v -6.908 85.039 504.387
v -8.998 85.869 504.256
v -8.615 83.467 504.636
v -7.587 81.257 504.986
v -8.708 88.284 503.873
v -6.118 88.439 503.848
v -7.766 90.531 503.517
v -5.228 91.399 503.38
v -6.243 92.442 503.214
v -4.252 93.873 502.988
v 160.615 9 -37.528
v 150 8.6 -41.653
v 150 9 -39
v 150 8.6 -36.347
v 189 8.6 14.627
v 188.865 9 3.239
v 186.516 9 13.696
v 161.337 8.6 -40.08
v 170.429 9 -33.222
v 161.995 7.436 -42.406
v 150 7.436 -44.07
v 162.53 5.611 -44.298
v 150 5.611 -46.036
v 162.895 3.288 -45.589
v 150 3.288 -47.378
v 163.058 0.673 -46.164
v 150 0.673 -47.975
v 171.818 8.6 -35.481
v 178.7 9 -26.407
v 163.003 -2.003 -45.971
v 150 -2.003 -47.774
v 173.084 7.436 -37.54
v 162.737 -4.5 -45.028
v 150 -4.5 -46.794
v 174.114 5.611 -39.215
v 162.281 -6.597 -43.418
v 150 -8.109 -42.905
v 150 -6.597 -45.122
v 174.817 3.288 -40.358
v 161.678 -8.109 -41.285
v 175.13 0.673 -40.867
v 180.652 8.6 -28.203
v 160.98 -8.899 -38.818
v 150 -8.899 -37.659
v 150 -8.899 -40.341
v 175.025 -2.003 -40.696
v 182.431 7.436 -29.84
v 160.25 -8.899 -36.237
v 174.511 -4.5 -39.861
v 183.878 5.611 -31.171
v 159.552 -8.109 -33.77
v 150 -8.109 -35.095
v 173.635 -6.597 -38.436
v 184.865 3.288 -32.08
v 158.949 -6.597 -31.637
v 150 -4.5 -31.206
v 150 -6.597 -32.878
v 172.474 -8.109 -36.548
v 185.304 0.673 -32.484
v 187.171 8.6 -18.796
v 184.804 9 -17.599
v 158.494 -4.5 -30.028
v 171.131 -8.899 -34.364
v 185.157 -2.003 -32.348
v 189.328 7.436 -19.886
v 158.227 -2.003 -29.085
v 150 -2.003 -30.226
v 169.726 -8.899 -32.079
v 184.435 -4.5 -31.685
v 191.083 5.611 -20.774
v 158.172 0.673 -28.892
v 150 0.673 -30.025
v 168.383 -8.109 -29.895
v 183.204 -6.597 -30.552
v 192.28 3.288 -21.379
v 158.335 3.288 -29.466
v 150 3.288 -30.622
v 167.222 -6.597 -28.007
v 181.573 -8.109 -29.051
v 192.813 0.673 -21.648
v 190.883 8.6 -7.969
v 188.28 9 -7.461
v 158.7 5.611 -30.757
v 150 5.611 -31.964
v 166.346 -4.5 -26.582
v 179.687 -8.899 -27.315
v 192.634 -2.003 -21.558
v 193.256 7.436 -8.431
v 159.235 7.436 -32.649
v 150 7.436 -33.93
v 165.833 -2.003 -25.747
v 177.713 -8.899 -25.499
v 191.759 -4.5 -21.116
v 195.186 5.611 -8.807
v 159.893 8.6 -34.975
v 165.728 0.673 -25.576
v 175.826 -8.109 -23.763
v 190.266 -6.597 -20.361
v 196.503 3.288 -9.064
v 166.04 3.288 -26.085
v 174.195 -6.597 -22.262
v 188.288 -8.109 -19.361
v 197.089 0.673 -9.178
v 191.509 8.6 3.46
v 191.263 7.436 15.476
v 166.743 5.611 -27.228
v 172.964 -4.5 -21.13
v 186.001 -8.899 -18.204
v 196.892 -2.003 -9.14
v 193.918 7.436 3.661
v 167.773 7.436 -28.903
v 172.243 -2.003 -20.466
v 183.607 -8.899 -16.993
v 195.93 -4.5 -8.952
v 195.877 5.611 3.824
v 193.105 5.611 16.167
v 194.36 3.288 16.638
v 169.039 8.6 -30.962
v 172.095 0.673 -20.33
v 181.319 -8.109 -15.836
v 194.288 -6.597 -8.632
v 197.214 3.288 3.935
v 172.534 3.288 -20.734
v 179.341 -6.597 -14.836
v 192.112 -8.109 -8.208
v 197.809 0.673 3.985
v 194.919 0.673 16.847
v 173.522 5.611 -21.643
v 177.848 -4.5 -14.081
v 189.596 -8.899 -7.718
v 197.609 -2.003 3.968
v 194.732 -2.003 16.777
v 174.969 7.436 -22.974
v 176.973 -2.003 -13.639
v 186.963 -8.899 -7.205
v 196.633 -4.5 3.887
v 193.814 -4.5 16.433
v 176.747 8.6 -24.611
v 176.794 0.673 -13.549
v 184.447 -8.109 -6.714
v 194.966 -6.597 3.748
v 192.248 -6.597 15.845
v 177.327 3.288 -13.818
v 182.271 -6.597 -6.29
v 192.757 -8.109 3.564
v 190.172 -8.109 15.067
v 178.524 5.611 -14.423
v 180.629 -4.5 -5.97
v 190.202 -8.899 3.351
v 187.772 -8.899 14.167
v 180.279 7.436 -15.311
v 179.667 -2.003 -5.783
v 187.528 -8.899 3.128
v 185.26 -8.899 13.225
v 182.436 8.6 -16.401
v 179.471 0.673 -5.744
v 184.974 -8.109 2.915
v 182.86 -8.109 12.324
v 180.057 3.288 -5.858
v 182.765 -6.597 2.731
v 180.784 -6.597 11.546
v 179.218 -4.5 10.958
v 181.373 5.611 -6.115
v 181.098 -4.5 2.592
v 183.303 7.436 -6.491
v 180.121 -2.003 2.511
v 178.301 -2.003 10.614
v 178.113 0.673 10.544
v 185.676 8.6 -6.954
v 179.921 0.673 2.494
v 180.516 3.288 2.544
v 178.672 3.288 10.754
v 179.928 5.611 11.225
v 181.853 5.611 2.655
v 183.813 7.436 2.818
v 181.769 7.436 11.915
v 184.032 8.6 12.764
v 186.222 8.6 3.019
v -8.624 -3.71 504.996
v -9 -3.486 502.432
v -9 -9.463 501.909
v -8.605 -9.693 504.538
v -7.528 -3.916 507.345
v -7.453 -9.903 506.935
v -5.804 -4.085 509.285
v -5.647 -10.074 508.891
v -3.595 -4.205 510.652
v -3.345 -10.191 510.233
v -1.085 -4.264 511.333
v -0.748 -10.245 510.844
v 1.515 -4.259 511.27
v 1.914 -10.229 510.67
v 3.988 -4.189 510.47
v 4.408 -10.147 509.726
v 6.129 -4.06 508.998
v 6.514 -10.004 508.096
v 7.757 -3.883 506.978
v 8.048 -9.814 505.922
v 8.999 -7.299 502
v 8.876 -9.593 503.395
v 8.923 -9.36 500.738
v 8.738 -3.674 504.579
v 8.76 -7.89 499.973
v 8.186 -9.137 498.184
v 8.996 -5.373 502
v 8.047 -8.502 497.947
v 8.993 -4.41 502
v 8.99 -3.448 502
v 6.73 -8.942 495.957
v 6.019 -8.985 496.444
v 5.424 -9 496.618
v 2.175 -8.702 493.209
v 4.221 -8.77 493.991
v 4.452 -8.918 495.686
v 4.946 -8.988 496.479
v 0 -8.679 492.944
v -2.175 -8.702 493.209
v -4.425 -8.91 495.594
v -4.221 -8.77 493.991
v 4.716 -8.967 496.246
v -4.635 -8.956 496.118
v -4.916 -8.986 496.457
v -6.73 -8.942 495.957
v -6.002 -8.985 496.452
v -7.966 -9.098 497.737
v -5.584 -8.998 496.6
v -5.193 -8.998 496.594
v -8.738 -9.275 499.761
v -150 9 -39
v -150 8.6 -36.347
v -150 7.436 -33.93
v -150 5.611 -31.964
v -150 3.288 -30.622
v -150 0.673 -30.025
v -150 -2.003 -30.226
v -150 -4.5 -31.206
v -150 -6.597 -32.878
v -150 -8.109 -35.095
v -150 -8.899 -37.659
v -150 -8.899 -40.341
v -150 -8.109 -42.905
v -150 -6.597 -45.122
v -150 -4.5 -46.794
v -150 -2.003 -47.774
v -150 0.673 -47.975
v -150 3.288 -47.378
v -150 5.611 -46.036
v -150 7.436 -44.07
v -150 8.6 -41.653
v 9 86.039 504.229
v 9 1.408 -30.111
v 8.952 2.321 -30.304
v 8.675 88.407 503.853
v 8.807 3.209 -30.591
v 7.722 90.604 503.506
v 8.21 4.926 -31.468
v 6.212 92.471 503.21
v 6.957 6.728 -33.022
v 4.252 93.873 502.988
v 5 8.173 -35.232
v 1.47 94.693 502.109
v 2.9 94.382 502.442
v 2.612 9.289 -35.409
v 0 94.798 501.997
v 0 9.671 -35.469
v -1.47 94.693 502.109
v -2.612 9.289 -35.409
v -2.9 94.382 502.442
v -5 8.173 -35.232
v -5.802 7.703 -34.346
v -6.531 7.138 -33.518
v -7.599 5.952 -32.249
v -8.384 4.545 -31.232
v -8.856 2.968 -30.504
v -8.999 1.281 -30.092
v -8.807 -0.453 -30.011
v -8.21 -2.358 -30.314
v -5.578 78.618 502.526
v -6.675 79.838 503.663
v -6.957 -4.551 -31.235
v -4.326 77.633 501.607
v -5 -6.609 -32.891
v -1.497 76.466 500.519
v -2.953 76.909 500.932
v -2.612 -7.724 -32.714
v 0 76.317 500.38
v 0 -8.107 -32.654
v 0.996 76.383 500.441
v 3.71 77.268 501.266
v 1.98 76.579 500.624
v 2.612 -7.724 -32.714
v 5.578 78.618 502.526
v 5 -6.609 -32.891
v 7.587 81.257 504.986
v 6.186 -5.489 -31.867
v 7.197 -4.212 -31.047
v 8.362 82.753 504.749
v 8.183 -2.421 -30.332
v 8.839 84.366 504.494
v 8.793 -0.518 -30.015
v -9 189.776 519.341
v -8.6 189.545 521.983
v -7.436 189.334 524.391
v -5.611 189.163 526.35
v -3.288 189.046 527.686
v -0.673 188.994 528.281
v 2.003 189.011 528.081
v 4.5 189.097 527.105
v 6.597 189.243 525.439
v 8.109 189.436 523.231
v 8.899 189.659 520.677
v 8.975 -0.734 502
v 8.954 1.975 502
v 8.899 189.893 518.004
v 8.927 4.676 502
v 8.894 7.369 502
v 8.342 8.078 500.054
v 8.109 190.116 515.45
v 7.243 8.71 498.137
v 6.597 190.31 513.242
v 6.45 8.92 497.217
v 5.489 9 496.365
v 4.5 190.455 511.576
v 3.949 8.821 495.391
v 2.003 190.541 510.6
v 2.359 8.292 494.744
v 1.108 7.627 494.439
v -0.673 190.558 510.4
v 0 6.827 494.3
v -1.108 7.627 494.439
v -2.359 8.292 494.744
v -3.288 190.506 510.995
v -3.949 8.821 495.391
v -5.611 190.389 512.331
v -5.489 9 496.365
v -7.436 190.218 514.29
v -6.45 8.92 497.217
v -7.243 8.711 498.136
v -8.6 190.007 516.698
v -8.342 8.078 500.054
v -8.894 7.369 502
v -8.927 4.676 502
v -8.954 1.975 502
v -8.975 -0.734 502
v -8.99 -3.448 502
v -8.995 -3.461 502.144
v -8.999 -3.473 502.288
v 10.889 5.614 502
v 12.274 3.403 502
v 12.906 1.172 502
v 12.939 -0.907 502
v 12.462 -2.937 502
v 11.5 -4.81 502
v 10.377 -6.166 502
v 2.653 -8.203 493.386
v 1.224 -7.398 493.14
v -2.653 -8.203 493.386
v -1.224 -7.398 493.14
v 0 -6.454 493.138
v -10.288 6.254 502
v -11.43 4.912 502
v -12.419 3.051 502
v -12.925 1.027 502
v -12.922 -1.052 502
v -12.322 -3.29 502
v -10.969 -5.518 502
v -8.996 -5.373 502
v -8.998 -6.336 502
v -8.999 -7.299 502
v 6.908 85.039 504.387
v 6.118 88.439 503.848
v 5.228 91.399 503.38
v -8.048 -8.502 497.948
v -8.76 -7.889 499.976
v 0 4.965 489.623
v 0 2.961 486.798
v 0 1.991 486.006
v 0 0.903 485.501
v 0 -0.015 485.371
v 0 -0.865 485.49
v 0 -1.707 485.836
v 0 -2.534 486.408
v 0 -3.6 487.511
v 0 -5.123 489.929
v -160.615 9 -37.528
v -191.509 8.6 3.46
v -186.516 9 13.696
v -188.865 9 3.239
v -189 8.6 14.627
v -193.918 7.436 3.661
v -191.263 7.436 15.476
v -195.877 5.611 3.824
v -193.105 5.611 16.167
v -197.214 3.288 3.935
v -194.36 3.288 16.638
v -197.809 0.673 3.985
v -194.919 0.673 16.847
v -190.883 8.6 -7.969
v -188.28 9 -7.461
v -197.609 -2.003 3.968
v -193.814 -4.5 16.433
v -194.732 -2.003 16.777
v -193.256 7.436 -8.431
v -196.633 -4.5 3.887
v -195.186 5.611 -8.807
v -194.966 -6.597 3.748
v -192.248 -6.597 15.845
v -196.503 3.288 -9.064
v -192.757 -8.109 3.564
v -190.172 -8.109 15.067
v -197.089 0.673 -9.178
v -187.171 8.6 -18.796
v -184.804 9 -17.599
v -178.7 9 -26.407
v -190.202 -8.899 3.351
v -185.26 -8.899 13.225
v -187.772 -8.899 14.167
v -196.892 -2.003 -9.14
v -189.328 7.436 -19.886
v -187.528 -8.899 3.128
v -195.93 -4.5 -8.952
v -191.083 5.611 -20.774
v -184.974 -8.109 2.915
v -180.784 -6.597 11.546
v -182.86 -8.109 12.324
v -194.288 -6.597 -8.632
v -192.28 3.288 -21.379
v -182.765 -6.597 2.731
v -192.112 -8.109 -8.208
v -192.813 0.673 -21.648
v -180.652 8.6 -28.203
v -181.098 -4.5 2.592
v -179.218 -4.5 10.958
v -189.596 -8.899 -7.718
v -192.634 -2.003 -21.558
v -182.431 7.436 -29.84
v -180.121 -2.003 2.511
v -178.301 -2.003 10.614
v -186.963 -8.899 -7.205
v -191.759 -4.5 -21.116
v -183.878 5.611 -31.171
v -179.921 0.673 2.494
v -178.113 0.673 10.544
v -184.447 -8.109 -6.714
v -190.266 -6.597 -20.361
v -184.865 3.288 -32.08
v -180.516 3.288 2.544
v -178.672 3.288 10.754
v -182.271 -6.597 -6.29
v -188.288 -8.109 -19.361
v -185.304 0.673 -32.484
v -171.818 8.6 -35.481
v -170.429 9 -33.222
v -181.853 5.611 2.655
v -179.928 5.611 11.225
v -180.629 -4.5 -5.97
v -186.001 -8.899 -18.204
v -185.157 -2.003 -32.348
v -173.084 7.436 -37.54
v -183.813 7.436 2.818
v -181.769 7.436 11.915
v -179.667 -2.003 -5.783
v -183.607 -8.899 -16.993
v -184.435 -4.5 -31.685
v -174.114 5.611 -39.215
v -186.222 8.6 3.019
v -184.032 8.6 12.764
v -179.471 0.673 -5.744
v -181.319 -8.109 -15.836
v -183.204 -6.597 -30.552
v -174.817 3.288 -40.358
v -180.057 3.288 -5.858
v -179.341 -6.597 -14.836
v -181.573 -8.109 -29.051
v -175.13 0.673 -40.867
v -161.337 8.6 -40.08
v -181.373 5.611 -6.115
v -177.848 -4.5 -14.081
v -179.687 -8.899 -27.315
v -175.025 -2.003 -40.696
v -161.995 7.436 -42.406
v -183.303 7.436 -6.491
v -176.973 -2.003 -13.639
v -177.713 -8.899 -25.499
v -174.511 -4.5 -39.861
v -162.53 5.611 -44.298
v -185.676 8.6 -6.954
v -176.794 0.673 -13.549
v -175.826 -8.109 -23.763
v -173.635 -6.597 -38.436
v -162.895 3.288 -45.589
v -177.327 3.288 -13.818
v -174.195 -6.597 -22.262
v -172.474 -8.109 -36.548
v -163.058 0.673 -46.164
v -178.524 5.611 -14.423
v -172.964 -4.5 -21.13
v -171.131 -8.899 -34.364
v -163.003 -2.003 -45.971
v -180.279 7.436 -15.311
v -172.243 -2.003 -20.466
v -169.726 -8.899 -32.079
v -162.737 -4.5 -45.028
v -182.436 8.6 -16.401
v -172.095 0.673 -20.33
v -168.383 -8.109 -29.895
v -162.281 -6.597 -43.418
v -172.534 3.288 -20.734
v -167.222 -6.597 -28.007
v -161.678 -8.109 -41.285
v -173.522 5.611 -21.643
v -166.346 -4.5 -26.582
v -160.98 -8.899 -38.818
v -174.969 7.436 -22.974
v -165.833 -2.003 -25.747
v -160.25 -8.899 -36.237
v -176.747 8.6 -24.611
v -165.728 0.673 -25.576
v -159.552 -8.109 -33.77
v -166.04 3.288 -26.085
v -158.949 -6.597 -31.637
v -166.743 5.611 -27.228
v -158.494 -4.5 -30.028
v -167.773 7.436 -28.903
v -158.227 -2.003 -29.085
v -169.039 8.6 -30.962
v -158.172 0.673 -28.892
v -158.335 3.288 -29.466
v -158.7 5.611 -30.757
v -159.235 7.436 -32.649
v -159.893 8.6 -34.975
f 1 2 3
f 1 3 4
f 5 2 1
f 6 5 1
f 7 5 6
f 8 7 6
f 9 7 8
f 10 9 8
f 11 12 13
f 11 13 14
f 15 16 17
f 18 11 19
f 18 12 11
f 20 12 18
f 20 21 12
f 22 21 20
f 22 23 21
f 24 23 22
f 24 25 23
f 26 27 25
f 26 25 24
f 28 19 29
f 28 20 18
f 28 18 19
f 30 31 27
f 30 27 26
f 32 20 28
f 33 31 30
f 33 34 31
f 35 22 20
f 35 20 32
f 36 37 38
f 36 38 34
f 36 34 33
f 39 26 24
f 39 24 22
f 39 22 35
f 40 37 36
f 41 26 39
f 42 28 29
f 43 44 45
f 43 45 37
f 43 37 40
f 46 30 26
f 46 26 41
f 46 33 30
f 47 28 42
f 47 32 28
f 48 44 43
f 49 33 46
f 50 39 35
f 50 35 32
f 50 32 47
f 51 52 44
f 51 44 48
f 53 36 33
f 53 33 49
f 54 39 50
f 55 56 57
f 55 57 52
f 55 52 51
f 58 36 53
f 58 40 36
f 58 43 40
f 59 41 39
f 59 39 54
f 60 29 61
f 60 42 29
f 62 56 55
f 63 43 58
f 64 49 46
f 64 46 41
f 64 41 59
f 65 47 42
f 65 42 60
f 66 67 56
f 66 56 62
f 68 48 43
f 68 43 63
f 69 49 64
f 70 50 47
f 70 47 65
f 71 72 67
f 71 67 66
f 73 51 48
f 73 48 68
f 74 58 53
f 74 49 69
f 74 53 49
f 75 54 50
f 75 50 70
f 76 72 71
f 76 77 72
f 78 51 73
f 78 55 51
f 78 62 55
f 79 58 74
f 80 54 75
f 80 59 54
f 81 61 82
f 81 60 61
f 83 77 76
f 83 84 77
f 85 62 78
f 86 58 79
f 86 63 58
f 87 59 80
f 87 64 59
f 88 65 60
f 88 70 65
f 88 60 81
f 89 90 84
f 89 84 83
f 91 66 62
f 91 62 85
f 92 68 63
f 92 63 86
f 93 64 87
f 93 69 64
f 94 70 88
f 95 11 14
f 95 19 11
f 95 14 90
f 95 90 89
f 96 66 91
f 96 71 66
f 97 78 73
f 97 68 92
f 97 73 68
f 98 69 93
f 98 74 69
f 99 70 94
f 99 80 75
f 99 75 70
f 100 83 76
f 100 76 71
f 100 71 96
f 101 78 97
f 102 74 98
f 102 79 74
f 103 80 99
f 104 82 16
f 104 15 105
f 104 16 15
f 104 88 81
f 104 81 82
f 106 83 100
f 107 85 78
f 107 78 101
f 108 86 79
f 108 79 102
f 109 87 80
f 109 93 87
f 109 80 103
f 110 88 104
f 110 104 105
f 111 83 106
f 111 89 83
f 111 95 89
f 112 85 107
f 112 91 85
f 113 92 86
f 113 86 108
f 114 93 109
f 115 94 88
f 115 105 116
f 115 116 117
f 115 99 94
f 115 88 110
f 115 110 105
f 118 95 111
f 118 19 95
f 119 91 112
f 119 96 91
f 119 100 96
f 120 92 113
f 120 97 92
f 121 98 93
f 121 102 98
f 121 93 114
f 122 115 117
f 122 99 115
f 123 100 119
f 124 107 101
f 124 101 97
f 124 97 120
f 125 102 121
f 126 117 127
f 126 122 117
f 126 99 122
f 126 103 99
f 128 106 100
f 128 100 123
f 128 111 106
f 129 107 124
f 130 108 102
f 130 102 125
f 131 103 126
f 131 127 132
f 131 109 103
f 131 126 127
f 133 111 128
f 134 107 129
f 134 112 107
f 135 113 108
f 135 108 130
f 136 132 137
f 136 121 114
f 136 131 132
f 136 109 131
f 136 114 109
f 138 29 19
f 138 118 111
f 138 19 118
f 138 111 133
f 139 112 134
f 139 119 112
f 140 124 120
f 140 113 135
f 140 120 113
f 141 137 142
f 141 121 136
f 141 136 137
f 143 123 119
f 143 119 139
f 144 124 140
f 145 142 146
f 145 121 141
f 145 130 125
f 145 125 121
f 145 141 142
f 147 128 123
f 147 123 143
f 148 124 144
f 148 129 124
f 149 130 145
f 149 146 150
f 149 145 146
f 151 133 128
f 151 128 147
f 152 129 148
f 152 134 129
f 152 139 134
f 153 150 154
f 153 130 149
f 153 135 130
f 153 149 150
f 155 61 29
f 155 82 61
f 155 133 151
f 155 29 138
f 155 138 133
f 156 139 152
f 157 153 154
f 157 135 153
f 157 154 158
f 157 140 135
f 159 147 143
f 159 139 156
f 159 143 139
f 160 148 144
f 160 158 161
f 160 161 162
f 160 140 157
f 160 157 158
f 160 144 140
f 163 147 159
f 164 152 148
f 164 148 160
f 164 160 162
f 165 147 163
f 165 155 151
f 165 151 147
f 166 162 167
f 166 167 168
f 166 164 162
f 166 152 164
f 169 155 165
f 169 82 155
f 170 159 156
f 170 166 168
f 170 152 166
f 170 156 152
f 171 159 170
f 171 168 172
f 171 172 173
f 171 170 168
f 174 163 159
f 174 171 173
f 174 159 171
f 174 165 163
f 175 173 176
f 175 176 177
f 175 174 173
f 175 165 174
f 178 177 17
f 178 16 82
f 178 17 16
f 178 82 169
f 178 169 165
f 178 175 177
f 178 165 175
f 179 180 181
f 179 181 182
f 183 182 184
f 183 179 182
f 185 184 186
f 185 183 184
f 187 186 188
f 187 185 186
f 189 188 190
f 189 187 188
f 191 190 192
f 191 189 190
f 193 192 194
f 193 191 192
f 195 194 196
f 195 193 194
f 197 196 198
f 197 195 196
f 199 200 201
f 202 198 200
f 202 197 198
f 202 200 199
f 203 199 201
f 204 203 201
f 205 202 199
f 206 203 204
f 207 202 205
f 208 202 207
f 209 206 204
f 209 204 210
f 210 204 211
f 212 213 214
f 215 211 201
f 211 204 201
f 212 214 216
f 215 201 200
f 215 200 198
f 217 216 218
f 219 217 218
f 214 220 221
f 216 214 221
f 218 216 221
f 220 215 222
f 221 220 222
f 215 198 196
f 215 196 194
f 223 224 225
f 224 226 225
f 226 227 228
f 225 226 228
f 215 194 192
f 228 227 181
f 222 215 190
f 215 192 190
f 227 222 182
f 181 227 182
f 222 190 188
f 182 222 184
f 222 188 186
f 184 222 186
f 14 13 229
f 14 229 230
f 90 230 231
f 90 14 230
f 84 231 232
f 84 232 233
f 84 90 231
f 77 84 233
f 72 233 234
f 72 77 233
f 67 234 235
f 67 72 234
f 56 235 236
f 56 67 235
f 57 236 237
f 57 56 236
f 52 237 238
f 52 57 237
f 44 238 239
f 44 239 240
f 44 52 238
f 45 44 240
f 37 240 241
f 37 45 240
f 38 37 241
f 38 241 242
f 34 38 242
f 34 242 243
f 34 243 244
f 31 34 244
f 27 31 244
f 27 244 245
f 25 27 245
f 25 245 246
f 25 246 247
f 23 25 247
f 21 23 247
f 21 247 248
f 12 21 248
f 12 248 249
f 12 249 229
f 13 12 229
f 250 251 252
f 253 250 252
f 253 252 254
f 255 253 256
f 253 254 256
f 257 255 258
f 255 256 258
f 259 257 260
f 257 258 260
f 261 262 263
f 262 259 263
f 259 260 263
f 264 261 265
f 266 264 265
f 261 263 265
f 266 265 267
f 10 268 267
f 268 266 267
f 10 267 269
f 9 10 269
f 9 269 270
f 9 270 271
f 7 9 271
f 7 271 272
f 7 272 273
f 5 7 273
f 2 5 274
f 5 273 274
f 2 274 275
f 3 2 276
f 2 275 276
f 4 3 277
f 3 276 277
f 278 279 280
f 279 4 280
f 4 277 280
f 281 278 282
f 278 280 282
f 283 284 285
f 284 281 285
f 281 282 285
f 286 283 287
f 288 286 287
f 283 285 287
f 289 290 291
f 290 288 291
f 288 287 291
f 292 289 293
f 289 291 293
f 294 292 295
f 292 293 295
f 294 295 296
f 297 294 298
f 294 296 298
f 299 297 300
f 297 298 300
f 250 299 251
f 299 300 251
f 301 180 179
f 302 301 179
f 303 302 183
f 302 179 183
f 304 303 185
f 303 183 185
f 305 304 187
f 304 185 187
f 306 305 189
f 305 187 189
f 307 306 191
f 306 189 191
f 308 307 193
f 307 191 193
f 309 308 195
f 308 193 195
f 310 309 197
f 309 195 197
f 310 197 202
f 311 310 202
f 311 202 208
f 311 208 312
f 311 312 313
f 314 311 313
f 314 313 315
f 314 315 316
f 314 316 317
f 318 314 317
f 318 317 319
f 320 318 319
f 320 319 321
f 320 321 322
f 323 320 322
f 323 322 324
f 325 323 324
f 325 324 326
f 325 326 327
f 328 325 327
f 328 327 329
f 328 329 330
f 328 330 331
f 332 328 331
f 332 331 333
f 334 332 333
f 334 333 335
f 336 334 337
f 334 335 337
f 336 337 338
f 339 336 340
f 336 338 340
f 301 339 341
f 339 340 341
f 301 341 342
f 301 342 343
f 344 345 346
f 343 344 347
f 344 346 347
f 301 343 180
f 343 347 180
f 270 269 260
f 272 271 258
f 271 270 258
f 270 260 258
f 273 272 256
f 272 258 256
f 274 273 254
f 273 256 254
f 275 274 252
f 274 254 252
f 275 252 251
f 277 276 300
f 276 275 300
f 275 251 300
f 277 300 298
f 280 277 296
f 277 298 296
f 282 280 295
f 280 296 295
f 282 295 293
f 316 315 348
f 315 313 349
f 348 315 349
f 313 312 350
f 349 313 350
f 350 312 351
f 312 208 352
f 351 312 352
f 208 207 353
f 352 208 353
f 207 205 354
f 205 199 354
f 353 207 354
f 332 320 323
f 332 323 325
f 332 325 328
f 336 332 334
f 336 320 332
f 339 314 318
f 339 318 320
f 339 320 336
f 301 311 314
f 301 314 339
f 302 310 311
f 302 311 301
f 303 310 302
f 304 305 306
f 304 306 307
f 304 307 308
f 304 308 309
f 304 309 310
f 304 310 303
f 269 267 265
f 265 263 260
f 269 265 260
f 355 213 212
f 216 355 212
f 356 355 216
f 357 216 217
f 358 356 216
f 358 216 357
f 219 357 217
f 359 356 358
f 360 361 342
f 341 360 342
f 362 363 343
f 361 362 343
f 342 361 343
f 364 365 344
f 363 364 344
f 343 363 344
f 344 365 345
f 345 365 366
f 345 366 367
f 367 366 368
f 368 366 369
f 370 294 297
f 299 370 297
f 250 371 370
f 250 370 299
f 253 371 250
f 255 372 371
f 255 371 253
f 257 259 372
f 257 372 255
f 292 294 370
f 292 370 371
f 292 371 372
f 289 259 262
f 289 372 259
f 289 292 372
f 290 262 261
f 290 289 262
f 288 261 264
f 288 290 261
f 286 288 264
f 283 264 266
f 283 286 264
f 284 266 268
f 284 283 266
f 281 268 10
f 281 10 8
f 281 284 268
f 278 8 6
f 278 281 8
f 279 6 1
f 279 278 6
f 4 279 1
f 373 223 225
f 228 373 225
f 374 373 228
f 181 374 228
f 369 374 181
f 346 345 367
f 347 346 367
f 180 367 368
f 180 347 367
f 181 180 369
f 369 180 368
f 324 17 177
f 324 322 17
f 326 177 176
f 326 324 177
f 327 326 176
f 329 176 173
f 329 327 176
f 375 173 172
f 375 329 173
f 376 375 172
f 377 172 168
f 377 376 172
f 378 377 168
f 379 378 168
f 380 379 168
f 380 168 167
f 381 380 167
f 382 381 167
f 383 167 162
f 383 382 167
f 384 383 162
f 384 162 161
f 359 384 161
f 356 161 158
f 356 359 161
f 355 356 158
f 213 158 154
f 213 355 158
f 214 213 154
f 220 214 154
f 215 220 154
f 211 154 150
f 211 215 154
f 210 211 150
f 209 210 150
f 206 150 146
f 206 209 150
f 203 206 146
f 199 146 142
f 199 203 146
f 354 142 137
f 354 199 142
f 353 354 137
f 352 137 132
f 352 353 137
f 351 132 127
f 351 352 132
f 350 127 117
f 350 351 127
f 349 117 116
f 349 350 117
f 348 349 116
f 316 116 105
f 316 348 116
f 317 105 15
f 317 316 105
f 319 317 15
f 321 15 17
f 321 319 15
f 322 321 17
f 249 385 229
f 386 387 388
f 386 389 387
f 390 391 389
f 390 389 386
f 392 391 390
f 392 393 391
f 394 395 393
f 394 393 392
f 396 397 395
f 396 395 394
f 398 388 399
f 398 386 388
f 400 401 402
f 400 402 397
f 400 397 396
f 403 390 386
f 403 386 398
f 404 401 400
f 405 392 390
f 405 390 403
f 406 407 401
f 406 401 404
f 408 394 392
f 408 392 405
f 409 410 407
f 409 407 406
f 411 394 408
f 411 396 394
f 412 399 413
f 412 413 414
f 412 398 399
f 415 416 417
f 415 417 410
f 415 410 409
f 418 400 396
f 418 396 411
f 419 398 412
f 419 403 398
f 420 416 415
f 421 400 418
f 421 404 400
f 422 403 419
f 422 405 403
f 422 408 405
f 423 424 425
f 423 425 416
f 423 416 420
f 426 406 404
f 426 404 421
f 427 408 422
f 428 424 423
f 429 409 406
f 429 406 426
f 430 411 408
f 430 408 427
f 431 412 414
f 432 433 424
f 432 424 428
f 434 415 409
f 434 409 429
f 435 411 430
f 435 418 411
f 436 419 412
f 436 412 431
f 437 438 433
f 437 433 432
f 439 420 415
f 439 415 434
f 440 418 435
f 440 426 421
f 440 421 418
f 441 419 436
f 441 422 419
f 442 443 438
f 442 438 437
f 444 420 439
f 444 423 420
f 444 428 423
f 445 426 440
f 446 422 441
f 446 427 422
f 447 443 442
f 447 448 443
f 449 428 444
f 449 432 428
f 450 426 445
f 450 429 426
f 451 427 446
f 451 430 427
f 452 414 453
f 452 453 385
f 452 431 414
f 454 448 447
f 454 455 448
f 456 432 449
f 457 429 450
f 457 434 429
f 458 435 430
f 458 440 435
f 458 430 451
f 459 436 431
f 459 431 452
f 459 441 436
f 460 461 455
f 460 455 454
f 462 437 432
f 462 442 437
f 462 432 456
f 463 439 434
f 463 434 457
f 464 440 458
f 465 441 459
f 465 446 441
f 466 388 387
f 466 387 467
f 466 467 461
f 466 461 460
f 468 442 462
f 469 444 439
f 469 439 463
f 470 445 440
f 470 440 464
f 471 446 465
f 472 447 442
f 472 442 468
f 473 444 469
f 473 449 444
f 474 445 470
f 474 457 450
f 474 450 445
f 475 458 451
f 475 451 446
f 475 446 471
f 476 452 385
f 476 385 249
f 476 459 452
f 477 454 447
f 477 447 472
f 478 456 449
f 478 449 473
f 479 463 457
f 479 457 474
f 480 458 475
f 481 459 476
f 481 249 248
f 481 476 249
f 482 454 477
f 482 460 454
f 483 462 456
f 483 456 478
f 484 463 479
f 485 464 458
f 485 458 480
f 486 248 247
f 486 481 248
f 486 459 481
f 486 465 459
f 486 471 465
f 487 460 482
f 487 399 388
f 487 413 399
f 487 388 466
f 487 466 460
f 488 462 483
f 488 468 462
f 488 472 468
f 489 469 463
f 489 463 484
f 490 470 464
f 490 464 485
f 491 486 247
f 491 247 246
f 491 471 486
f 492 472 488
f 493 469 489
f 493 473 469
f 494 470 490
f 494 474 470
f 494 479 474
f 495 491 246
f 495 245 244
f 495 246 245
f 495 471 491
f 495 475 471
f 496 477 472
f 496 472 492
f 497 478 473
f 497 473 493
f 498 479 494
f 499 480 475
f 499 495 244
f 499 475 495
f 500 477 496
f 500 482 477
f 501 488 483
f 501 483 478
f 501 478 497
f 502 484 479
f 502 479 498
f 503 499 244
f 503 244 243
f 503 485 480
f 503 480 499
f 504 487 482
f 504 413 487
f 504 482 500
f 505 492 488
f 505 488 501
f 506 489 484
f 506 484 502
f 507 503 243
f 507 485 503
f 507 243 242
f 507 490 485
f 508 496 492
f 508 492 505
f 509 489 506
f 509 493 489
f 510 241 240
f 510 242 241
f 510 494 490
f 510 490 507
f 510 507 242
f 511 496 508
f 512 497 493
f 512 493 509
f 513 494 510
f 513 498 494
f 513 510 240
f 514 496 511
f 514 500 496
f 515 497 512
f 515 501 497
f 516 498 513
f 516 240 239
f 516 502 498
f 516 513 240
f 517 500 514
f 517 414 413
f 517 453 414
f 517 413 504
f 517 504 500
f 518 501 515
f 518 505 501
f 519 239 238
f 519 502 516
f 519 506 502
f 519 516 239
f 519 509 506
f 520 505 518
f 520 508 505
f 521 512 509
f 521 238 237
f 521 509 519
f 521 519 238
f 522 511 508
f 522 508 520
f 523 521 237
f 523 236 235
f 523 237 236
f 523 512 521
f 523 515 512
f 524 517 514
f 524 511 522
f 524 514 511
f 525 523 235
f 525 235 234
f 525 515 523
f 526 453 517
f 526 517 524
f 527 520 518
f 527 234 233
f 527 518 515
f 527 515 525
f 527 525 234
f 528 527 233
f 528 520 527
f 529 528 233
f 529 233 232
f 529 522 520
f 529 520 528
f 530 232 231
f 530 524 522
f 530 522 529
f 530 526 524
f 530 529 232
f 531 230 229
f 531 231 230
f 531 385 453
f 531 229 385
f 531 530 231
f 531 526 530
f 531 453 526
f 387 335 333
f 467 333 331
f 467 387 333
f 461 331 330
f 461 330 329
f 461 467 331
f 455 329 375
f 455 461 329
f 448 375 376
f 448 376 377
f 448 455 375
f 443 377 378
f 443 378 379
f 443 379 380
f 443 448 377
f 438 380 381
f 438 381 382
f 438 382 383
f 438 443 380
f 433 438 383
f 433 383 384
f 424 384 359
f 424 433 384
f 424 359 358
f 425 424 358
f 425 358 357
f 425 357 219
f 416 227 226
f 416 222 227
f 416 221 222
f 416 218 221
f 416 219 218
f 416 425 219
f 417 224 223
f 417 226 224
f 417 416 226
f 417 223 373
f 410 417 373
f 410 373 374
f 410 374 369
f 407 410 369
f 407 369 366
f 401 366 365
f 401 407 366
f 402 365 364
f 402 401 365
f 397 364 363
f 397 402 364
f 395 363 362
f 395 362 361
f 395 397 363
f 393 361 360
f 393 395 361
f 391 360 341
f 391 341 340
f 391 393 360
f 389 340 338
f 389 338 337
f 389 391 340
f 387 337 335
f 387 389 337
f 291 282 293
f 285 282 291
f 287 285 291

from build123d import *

# Parameters (mm, degrees)
F3_R           = 9
F7_W           = 211.4251245066
F7_H           = 70.145696709
F8_DEPTH       = 12.5
F9_R           = 9
F10_DEPTH      = 194
F10_DEPTH_BACK = 6
F16_START      = 5
F15_R          = 9
F16_DEPTH      = 545


with BuildPart() as f4:
    # F4: sweep along a path in F1
    with BuildLine(Plane.XZ) as f4_path:
        Line((-150, -39), (150, -39))
        ThreePointArc((150, -39), (182.0556281104, -22.2134352689), (186.5161856429, 13.6955535155))
        Line((186.5161856429, 13.6955535155), (0, 511))
        Line((0, 511), (-186.5161856429, 13.6955535155))
        ThreePointArc((-186.5161856429, 13.6955535155), (-182.0556281104, -22.2134352689), (-150, -39))
    # F3 (on line) → F4 (sweep)
    with BuildSketch(Plane.YZ.offset(150)):
        with Locations((0, -39)):
            Circle(F3_R)
    sweep(path=f4_path.line, transition=Transition.RIGHT)

    # F7 (on Front) → F8 (cut, symmetric)
    with BuildSketch(Plane.XZ):
        with Locations((16.5445394814, 537.0728483545)):
            Rectangle(F7_W, F7_H)
    extrude(amount=F8_DEPTH, both=True, mode=Mode.SUBTRACT)

    # F9 (on face) → F10 (join, two sides)
    with BuildSketch(Plane(origin=(0, 40.1639663204, 3.5138917353), x_dir=(-1, 0, 0), z_dir=(0, 0.9961946981, 0.0871557427))) as f10_sk:
        with Locations((0, 500.8241835071)):
            Circle(F9_R)
    extrude(amount=F10_DEPTH)
    extrude(f10_sk.sketch, amount=-F10_DEPTH_BACK)


with BuildPart() as f16:
    # F15 (on line) → F16 (new body)
    with BuildSketch(Plane(origin=(0, -6.0258313903, -38.0456020678), x_dir=(1, 0, 0), z_dir=(0, 0.156434465, 0.9876883406)).offset(F16_START)):
        with Locations((0, 6.1009441366)):
            Circle(F15_R)
    extrude(amount=F16_DEPTH)

    # F17: cut F4
    add(f4.part, mode=Mode.SUBTRACT)


solid = Compound([f4.part, f16.part])
